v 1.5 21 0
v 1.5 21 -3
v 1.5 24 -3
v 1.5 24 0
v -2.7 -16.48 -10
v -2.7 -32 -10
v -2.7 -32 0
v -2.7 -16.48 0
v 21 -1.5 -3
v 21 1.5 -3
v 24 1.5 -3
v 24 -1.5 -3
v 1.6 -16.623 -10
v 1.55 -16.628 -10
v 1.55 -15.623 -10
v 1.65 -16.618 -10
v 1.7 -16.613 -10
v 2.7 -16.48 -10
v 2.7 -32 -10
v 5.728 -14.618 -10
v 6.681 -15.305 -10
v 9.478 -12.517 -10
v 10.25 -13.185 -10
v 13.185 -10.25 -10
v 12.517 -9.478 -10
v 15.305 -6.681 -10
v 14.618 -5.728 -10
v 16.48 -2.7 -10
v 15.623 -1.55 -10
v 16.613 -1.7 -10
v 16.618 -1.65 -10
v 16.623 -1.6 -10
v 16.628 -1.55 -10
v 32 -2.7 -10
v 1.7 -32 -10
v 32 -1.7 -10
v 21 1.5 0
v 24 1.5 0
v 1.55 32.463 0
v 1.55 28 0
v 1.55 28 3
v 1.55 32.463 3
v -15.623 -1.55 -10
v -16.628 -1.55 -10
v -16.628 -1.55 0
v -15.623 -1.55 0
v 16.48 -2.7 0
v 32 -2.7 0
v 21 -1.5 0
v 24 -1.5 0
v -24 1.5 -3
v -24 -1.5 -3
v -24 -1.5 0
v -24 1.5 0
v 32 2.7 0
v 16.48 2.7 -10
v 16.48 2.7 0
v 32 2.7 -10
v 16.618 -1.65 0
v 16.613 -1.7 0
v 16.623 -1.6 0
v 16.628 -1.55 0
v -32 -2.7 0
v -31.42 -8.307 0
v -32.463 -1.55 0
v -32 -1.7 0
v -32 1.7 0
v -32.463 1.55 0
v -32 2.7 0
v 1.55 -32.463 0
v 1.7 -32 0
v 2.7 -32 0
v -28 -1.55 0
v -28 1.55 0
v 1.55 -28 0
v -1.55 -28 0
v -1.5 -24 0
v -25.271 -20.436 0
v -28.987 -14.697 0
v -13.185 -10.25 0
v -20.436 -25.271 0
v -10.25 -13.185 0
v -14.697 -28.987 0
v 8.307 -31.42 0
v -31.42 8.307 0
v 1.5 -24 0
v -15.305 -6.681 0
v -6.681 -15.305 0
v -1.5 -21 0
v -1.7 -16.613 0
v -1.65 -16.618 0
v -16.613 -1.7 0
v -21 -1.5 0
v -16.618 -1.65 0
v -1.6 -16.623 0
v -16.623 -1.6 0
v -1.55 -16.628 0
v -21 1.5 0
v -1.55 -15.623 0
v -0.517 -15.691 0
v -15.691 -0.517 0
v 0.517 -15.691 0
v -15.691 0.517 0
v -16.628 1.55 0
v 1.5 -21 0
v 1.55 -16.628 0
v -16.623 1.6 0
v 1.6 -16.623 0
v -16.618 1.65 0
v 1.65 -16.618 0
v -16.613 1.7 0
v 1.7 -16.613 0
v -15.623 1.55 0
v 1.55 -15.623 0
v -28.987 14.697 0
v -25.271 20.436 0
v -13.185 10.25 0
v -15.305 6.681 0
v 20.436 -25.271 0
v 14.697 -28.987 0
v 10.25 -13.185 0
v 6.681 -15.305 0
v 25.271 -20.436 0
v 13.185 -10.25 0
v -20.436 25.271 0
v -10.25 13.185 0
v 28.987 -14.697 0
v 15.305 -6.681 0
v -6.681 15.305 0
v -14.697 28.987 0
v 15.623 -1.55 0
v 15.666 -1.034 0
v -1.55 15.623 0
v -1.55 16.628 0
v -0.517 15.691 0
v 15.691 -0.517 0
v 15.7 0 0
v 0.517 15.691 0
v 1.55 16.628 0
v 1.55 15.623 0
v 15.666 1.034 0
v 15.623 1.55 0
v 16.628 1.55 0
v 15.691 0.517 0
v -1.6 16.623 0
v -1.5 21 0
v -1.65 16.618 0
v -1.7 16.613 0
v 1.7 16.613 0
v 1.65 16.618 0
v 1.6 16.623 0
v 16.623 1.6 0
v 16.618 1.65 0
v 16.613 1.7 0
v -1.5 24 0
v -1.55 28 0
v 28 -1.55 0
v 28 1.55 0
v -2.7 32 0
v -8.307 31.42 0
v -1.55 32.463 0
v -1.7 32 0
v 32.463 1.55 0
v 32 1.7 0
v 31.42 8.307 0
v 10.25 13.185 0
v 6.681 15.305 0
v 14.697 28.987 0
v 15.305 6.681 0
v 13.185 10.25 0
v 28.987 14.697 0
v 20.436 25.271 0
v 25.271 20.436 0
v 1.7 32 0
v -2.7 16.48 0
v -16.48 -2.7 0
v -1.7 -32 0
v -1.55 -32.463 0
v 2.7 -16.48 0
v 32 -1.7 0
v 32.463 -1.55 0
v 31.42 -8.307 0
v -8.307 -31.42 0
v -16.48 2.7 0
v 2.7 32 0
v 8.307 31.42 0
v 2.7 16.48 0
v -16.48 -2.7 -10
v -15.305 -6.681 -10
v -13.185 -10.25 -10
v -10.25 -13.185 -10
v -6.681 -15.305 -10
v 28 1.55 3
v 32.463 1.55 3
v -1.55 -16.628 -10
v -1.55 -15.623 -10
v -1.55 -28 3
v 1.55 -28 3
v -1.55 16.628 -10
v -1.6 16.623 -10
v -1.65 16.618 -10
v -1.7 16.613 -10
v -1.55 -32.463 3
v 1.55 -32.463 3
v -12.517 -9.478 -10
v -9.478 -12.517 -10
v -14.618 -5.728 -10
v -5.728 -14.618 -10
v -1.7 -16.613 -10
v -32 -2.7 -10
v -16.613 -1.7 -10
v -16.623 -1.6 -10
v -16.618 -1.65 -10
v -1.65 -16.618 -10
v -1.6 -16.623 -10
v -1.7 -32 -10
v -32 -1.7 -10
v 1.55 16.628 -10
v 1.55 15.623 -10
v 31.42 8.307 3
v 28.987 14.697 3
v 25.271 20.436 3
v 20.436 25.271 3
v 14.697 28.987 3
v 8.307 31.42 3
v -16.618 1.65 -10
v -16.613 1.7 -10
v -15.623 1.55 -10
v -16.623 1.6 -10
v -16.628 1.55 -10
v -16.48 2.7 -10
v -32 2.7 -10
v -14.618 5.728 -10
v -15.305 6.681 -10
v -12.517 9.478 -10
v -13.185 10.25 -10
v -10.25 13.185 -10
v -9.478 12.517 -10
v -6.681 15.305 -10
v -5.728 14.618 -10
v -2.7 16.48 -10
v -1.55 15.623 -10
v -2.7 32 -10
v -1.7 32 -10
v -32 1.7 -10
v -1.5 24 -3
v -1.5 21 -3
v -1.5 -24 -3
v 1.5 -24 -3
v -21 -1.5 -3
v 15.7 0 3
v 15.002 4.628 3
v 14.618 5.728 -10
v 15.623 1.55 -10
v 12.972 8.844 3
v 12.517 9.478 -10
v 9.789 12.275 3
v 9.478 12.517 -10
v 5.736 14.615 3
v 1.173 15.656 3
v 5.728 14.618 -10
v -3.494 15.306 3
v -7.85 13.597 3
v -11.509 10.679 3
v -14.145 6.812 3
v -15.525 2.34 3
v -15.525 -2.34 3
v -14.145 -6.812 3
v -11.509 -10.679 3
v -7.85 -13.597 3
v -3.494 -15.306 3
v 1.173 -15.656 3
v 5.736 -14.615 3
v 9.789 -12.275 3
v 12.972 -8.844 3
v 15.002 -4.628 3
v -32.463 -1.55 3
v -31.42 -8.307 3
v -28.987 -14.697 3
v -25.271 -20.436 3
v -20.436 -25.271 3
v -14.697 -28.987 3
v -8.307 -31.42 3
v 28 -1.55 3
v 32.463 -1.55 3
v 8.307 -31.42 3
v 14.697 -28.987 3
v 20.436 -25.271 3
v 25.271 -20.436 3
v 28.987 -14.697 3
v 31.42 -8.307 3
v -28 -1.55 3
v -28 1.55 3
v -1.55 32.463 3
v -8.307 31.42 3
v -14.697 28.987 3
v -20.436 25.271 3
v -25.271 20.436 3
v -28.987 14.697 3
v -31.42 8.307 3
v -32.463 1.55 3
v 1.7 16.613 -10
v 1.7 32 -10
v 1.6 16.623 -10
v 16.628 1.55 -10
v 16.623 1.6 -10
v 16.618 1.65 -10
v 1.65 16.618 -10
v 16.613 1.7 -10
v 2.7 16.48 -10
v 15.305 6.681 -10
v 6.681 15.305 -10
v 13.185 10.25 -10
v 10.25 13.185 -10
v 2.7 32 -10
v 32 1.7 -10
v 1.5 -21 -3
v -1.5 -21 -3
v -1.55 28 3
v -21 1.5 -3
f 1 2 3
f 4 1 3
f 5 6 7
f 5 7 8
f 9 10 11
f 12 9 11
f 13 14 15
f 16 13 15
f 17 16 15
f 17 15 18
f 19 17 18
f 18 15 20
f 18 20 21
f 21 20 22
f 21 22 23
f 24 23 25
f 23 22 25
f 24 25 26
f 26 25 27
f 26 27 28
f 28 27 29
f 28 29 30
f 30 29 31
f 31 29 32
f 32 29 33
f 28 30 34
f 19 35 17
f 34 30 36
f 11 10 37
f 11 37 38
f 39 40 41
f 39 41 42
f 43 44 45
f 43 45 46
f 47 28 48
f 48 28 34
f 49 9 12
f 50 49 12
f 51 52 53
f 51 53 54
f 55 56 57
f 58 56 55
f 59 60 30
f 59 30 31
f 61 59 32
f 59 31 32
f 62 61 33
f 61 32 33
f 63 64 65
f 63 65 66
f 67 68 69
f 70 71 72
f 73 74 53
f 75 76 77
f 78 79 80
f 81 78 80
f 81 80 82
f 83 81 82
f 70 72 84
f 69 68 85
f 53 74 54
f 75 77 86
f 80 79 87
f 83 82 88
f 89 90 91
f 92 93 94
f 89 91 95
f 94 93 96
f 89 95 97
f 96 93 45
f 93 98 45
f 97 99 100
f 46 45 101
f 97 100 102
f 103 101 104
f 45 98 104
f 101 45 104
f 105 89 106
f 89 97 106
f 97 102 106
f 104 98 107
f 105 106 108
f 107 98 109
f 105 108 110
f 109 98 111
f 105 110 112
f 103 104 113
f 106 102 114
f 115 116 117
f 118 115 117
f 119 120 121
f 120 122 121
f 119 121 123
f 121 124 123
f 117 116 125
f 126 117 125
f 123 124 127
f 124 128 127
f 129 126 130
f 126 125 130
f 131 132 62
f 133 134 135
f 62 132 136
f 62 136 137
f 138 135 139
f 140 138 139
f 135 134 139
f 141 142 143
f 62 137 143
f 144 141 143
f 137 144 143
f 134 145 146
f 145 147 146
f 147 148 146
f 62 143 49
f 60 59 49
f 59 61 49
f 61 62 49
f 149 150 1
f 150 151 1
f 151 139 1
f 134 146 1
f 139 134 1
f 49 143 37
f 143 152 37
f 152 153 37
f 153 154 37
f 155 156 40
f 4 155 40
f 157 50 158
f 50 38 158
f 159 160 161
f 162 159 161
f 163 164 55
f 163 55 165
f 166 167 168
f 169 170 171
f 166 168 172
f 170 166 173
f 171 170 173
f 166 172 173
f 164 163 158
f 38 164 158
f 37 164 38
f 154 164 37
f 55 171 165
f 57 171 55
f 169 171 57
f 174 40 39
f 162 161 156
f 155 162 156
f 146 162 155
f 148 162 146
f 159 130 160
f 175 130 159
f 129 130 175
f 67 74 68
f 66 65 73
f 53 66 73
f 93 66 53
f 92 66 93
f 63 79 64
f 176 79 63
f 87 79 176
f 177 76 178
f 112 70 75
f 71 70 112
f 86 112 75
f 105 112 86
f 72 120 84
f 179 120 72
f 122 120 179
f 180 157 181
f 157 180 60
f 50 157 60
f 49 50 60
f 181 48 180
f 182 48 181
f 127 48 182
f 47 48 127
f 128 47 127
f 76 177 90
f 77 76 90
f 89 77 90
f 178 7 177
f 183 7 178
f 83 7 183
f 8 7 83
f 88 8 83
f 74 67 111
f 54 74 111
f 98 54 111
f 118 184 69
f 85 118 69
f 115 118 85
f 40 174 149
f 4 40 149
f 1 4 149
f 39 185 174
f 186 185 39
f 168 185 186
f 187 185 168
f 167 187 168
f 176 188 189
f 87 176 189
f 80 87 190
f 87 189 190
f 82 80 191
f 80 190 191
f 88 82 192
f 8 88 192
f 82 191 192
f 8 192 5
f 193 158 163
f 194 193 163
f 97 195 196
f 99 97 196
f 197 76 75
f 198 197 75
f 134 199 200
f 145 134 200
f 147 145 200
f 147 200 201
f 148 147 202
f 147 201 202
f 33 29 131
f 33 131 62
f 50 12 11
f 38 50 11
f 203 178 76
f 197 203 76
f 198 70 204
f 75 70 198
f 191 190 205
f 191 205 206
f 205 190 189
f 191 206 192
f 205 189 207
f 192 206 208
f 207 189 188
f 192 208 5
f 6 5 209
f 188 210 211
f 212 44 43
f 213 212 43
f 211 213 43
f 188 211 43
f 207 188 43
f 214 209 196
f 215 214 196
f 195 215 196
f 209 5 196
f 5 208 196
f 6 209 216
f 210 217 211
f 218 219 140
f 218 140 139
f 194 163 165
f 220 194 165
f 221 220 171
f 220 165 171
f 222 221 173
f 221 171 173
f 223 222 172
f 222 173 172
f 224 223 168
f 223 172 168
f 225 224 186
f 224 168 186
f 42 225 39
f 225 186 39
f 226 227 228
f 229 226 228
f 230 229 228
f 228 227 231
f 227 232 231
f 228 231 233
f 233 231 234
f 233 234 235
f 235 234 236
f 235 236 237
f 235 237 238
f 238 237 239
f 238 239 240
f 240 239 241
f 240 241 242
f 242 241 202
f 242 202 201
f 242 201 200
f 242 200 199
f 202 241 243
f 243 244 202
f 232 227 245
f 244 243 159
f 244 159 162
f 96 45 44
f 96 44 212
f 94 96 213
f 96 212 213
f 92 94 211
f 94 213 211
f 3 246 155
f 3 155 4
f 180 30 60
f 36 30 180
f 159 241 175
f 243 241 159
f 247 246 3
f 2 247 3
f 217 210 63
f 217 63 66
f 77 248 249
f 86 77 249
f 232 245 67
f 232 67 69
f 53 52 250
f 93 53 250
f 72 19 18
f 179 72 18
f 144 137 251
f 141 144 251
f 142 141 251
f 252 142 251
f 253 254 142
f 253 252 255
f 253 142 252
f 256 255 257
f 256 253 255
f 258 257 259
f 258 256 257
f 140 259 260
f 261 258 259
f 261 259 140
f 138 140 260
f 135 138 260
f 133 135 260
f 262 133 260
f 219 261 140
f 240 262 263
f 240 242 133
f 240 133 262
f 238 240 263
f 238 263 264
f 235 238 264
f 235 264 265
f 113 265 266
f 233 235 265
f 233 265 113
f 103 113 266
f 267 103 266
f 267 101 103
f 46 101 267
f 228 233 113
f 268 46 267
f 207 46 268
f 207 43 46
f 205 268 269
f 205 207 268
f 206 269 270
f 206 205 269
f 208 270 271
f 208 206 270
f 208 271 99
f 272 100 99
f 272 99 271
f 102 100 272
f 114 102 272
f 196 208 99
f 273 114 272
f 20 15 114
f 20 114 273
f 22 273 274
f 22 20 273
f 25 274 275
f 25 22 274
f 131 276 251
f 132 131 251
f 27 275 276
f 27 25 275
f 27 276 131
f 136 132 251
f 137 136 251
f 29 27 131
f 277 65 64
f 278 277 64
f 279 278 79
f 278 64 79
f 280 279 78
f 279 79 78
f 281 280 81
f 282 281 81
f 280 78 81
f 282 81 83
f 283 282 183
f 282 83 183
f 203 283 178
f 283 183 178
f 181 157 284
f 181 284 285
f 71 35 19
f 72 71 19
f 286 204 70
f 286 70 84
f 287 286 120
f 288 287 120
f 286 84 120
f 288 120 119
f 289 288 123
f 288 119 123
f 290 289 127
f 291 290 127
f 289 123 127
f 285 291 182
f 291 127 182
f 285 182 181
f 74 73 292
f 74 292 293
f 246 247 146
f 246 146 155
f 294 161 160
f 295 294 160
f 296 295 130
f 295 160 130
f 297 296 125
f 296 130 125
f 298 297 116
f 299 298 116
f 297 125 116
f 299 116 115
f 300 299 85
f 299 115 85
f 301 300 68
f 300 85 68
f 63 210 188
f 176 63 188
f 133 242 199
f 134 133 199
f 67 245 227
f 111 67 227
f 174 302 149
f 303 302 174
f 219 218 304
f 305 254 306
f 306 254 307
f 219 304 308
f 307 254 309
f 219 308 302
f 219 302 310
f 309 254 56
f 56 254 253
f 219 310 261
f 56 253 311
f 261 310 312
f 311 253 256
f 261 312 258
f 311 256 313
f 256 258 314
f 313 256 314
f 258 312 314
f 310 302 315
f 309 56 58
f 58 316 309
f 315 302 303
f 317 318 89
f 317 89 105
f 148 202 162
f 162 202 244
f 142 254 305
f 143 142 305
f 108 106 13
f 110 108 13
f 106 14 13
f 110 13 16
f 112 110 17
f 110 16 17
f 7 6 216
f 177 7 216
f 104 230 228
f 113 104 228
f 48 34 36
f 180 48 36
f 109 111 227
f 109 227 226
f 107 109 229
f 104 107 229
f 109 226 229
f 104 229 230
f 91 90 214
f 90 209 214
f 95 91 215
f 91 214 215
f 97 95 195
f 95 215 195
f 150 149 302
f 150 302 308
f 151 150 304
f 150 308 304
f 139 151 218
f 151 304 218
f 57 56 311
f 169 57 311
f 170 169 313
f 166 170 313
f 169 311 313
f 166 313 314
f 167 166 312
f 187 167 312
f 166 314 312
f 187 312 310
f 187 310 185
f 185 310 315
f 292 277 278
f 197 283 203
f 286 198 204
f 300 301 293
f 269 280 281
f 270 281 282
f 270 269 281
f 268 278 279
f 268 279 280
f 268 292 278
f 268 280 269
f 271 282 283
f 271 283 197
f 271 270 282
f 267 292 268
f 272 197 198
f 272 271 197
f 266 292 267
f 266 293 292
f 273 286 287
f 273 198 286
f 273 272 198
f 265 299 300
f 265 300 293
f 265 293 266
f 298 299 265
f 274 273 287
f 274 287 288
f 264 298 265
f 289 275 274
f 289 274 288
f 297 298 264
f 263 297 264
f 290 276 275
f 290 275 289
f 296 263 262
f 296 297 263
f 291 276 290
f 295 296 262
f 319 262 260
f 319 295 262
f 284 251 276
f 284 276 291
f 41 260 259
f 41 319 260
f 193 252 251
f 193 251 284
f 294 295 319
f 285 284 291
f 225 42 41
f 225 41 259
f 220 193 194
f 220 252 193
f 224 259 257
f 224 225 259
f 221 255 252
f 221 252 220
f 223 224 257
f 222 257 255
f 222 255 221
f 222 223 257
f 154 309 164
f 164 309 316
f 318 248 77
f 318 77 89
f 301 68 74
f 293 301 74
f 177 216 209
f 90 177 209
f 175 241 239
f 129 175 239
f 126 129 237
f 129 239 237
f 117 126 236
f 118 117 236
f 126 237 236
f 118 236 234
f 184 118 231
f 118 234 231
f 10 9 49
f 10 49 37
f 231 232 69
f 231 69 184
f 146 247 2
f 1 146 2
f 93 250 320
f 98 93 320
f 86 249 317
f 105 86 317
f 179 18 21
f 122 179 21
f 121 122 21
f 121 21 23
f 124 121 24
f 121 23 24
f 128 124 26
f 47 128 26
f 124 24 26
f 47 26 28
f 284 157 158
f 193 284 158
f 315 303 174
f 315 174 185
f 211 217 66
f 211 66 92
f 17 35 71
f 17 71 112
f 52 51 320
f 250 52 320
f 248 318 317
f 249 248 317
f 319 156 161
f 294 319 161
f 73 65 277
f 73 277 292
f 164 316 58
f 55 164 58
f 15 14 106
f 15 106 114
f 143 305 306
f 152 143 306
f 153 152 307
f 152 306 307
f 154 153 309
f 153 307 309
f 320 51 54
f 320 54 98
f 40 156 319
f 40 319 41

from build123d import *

# Parameters (mm, degrees)
BOX017_W      = 3
BOX017_H      = 3
BOX017_DEPTH  = 3
BOX018_W      = 3
BOX018_H      = 3
BOX018_DEPTH  = 3
BOX019_W      = 3
BOX019_H      = 3
BOX019_DEPTH  = 3
BOX016_W      = 3
BOX016_H      = 3
BOX016_DEPTH  = 3
BOX012_W      = 3.1
BOX012_H      = 6
BOX012_DEPTH  = 10
BOX013_W      = 3.1
BOX013_H      = 6
BOX013_DEPTH  = 10
BOX014_W      = 6
BOX014_H      = 3.1
BOX014_DEPTH  = 10
BOX015_W      = 6
BOX015_H      = 3.1
BOX015_DEPTH  = 10
BOX001_W      = 3.1
BOX001_H      = 6
BOX001_DEPTH  = 3
BOX002_W      = 6
BOX002_H      = 3.1
BOX002_DEPTH  = 3
BOX003_W      = 6
BOX003_H      = 3.1
BOX003_DEPTH  = 3
BOX_W         = 3.1
BOX_H         = 6
BOX_DEPTH     = 3
TUBE001_R     = 16.7
TUBE001_R_2   = 15.7
TUBE001_DEPTH = 10
BOX005_W      = 1
BOX005_H      = 16
BOX005_DEPTH  = 10
BOX006_W      = 1
BOX006_H      = 16
BOX006_DEPTH  = 10
BOX007_W      = 1
BOX007_H      = 16
BOX007_DEPTH  = 10
BOX008_W      = 16
BOX008_H      = 1
BOX008_DEPTH  = 10
BOX009_W      = 16
BOX009_H      = 1
BOX009_DEPTH  = 10
BOX010_W      = 16
BOX010_H      = 1
BOX010_DEPTH  = 10
BOX011_W      = 16
BOX011_H      = 1
BOX011_DEPTH  = 10
BOX004_W      = 1
BOX004_H      = 16
BOX004_DEPTH  = 10
TUBE_R        = 32.5
TUBE_R_2      = 15.7
TUBE_DEPTH    = 3


with BuildPart() as finlock002:
    # Box017 → Box017 (new body)
    with BuildSketch(Plane(origin=(-1.5, 21, -3), x_dir=(1, 0, 0), z_dir=(0, 0, 1))):
        with Locations((1.5, 1.5)):
            Rectangle(BOX017_W, BOX017_H)
    extrude(amount=BOX017_DEPTH)


with BuildPart() as finlock003:
    # Box018 → Box018 (new body)
    with BuildSketch(Plane(origin=(-1.5, -24, -3), x_dir=(1, 0, 0), z_dir=(0, 0, 1))):
        with Locations((1.5, 1.5)):
            Rectangle(BOX018_W, BOX018_H)
    extrude(amount=BOX018_DEPTH)


with BuildPart() as finlock004:
    # Box019 → Box019 (new body)
    with BuildSketch(Plane(origin=(-24, -1.5, -3), x_dir=(1, 0, 0), z_dir=(0, 0, 1))):
        with Locations((1.5, 1.5)):
            Rectangle(BOX019_W, BOX019_H)
    extrude(amount=BOX019_DEPTH)


with BuildPart() as finlocks:
    # Box016 → Box016 (new body)
    with BuildSketch(Plane(origin=(21, -1.5, -3), x_dir=(1, 0, 0), z_dir=(0, 0, 1))):
        with Locations((1.5, 1.5)):
            Rectangle(BOX016_W, BOX016_H)
    extrude(amount=BOX016_DEPTH)

    # Fusion005: union FinLock002, FinLock003, FinLock004
    add(finlock002.part)
    add(finlock003.part)
    add(finlock004.part)


with BuildPart() as fincut005:
    # Box012 → Box012 (new body)
    with BuildSketch(Plane(origin=(-1.55, -21, -10), x_dir=(1, 0, 0), z_dir=(0, 0, 1))):
        with Locations((1.55, 3)):
            Rectangle(BOX012_W, BOX012_H)
    extrude(amount=BOX012_DEPTH)


with BuildPart() as fincut006:
    # Box013 → Box013 (new body)
    with BuildSketch(Plane(origin=(-1.55, 15, -10), x_dir=(1, 0, 0), z_dir=(0, 0, 1))):
        with Locations((1.55, 3)):
            Rectangle(BOX013_W, BOX013_H)
    extrude(amount=BOX013_DEPTH)


with BuildPart() as fincut007:
    # Box014 → Box014 (new body)
    with BuildSketch(Plane(origin=(15, -1.55, -10), x_dir=(1, 0, 0), z_dir=(0, 0, 1))):
        with Locations((3, 1.55)):
            Rectangle(BOX014_W, BOX014_H)
    extrude(amount=BOX014_DEPTH)


with BuildPart() as innerfincutouts:
    # Box015 → Box015 (new body)
    with BuildSketch(Plane(origin=(-21, -1.55, -10), x_dir=(1, 0, 0), z_dir=(0, 0, 1))):
        with Locations((3, 1.55)):
            Rectangle(BOX015_W, BOX015_H)
    extrude(amount=BOX015_DEPTH)

    # Fusion002: union FinCut005, FinCut006, FinCut007
    add(fincut005.part)
    add(fincut006.part)
    add(fincut007.part)


with BuildPart() as fincut002:
    # Box001 → Box001 (new body)
    with BuildSketch(Plane(origin=(-1.55, 28, 0), x_dir=(1, 0, 0), z_dir=(0, 0, 1))):
        with Locations((1.55, 3)):
            Rectangle(BOX001_W, BOX001_H)
    extrude(amount=BOX001_DEPTH)


with BuildPart() as fincut003:
    # Box002 → Box002 (new body)
    with BuildSketch(Plane(origin=(28, -1.55, 0), x_dir=(1, 0, 0), z_dir=(0, 0, 1))):
        with Locations((3, 1.55)):
            Rectangle(BOX002_W, BOX002_H)
    extrude(amount=BOX002_DEPTH)


with BuildPart() as fincut004:
    # Box003 → Box003 (new body)
    with BuildSketch(Plane(origin=(-34, -1.55, 0), x_dir=(1, 0, 0), z_dir=(0, 0, 1))):
        with Locations((3, 1.55)):
            Rectangle(BOX003_W, BOX003_H)
    extrude(amount=BOX003_DEPTH)


with BuildPart() as fincutouts:
    # Box → Box (new body)
    with BuildSketch(Plane(origin=(-1.55, -34, 0), x_dir=(1, 0, 0), z_dir=(0, 0, 1))):
        with Locations((1.55, 3)):
            Rectangle(BOX_W, BOX_H)
    extrude(amount=BOX_DEPTH)

    # Fusion: union FinCut002, FinCut003, FinCut004
    add(fincut002.part)
    add(fincut003.part)
    add(fincut004.part)

    # Fusion003: union InnerFinCutouts
    add(innerfincutouts.part)


with BuildPart() as innertube:
    # Tube001 → Tube001 (new body)
    with BuildSketch(Plane.XY.offset(-10)):
        Circle(TUBE001_R)
        Circle(TUBE001_R_2, mode=Mode.SUBTRACT)
    extrude(amount=TUBE001_DEPTH)


with BuildPart() as alignment002:
    # Box005 → Box005 (new body)
    with BuildSketch(Plane(origin=(-2.7, 16, -10), x_dir=(1, 0, 0), z_dir=(0, 0, 1))):
        with Locations((0.5, 8)):
            Rectangle(BOX005_W, BOX005_H)
    extrude(amount=BOX005_DEPTH)


with BuildPart() as alignment003:
    # Box006 → Box006 (new body)
    with BuildSketch(Plane(origin=(-2.7, -32, -10), x_dir=(1, 0, 0), z_dir=(0, 0, 1))):
        with Locations((0.5, 8)):
            Rectangle(BOX006_W, BOX006_H)
    extrude(amount=BOX006_DEPTH)


with BuildPart() as alignment004:
    # Box007 → Box007 (new body)
    with BuildSketch(Plane(origin=(1.7, -32, -10), x_dir=(1, 0, 0), z_dir=(0, 0, 1))):
        with Locations((0.5, 8)):
            Rectangle(BOX007_W, BOX007_H)
    extrude(amount=BOX007_DEPTH)


with BuildPart() as alignment005:
    # Box008 → Box008 (new body)
    with BuildSketch(Plane(origin=(16, 1.7, -10), x_dir=(1, 0, 0), z_dir=(0, 0, 1))):
        with Locations((8, 0.5)):
            Rectangle(BOX008_W, BOX008_H)
    extrude(amount=BOX008_DEPTH)


with BuildPart() as alignment006:
    # Box009 → Box009 (new body)
    with BuildSketch(Plane(origin=(16, -2.7, -10), x_dir=(1, 0, 0), z_dir=(0, 0, 1))):
        with Locations((8, 0.5)):
            Rectangle(BOX009_W, BOX009_H)
    extrude(amount=BOX009_DEPTH)


with BuildPart() as alignment007:
    # Box010 → Box010 (new body)
    with BuildSketch(Plane(origin=(-32, 1.7, -10), x_dir=(1, 0, 0), z_dir=(0, 0, 1))):
        with Locations((8, 0.5)):
            Rectangle(BOX010_W, BOX010_H)
    extrude(amount=BOX010_DEPTH)


with BuildPart() as alignment008:
    # Box011 → Box011 (new body)
    with BuildSketch(Plane(origin=(-32, -2.7, -10), x_dir=(1, 0, 0), z_dir=(0, 0, 1))):
        with Locations((8, 0.5)):
            Rectangle(BOX011_W, BOX011_H)
    extrude(amount=BOX011_DEPTH)


with BuildPart() as alignmenttabs:
    # Box004 → Box004 (new body)
    with BuildSketch(Plane(origin=(1.7, 16, -10), x_dir=(1, 0, 0), z_dir=(0, 0, 1))):
        with Locations((0.5, 8)):
            Rectangle(BOX004_W, BOX004_H)
    extrude(amount=BOX004_DEPTH)

    # Fusion001: union Alignment002, Alignment003, Alignment004, Alignment005, Alignment006, Alignment007, Alignment008
    add(alignment002.part)
    add(alignment003.part)
    add(alignment004.part)
    add(alignment005.part)
    add(alignment006.part)
    add(alignment007.part)
    add(alignment008.part)


with BuildPart() as centeringringwithalignmentandfinlocks:
    # Tube → Tube (new body)
    with BuildSketch(Plane.XY):
        Circle(TUBE_R)
        Circle(TUBE_R_2, mode=Mode.SUBTRACT)
    extrude(amount=TUBE_DEPTH)

    # Fusion004: union InnerTube, AlignmentTabs
    add(innertube.part)
    add(alignmenttabs.part)

    # Cut: cut FinCutouts
    add(fincutouts.part, mode=Mode.SUBTRACT)

    # Connect: union FinLocks
    add(finlocks.part)


solid = centeringringwithalignmentandfinlocks.part
